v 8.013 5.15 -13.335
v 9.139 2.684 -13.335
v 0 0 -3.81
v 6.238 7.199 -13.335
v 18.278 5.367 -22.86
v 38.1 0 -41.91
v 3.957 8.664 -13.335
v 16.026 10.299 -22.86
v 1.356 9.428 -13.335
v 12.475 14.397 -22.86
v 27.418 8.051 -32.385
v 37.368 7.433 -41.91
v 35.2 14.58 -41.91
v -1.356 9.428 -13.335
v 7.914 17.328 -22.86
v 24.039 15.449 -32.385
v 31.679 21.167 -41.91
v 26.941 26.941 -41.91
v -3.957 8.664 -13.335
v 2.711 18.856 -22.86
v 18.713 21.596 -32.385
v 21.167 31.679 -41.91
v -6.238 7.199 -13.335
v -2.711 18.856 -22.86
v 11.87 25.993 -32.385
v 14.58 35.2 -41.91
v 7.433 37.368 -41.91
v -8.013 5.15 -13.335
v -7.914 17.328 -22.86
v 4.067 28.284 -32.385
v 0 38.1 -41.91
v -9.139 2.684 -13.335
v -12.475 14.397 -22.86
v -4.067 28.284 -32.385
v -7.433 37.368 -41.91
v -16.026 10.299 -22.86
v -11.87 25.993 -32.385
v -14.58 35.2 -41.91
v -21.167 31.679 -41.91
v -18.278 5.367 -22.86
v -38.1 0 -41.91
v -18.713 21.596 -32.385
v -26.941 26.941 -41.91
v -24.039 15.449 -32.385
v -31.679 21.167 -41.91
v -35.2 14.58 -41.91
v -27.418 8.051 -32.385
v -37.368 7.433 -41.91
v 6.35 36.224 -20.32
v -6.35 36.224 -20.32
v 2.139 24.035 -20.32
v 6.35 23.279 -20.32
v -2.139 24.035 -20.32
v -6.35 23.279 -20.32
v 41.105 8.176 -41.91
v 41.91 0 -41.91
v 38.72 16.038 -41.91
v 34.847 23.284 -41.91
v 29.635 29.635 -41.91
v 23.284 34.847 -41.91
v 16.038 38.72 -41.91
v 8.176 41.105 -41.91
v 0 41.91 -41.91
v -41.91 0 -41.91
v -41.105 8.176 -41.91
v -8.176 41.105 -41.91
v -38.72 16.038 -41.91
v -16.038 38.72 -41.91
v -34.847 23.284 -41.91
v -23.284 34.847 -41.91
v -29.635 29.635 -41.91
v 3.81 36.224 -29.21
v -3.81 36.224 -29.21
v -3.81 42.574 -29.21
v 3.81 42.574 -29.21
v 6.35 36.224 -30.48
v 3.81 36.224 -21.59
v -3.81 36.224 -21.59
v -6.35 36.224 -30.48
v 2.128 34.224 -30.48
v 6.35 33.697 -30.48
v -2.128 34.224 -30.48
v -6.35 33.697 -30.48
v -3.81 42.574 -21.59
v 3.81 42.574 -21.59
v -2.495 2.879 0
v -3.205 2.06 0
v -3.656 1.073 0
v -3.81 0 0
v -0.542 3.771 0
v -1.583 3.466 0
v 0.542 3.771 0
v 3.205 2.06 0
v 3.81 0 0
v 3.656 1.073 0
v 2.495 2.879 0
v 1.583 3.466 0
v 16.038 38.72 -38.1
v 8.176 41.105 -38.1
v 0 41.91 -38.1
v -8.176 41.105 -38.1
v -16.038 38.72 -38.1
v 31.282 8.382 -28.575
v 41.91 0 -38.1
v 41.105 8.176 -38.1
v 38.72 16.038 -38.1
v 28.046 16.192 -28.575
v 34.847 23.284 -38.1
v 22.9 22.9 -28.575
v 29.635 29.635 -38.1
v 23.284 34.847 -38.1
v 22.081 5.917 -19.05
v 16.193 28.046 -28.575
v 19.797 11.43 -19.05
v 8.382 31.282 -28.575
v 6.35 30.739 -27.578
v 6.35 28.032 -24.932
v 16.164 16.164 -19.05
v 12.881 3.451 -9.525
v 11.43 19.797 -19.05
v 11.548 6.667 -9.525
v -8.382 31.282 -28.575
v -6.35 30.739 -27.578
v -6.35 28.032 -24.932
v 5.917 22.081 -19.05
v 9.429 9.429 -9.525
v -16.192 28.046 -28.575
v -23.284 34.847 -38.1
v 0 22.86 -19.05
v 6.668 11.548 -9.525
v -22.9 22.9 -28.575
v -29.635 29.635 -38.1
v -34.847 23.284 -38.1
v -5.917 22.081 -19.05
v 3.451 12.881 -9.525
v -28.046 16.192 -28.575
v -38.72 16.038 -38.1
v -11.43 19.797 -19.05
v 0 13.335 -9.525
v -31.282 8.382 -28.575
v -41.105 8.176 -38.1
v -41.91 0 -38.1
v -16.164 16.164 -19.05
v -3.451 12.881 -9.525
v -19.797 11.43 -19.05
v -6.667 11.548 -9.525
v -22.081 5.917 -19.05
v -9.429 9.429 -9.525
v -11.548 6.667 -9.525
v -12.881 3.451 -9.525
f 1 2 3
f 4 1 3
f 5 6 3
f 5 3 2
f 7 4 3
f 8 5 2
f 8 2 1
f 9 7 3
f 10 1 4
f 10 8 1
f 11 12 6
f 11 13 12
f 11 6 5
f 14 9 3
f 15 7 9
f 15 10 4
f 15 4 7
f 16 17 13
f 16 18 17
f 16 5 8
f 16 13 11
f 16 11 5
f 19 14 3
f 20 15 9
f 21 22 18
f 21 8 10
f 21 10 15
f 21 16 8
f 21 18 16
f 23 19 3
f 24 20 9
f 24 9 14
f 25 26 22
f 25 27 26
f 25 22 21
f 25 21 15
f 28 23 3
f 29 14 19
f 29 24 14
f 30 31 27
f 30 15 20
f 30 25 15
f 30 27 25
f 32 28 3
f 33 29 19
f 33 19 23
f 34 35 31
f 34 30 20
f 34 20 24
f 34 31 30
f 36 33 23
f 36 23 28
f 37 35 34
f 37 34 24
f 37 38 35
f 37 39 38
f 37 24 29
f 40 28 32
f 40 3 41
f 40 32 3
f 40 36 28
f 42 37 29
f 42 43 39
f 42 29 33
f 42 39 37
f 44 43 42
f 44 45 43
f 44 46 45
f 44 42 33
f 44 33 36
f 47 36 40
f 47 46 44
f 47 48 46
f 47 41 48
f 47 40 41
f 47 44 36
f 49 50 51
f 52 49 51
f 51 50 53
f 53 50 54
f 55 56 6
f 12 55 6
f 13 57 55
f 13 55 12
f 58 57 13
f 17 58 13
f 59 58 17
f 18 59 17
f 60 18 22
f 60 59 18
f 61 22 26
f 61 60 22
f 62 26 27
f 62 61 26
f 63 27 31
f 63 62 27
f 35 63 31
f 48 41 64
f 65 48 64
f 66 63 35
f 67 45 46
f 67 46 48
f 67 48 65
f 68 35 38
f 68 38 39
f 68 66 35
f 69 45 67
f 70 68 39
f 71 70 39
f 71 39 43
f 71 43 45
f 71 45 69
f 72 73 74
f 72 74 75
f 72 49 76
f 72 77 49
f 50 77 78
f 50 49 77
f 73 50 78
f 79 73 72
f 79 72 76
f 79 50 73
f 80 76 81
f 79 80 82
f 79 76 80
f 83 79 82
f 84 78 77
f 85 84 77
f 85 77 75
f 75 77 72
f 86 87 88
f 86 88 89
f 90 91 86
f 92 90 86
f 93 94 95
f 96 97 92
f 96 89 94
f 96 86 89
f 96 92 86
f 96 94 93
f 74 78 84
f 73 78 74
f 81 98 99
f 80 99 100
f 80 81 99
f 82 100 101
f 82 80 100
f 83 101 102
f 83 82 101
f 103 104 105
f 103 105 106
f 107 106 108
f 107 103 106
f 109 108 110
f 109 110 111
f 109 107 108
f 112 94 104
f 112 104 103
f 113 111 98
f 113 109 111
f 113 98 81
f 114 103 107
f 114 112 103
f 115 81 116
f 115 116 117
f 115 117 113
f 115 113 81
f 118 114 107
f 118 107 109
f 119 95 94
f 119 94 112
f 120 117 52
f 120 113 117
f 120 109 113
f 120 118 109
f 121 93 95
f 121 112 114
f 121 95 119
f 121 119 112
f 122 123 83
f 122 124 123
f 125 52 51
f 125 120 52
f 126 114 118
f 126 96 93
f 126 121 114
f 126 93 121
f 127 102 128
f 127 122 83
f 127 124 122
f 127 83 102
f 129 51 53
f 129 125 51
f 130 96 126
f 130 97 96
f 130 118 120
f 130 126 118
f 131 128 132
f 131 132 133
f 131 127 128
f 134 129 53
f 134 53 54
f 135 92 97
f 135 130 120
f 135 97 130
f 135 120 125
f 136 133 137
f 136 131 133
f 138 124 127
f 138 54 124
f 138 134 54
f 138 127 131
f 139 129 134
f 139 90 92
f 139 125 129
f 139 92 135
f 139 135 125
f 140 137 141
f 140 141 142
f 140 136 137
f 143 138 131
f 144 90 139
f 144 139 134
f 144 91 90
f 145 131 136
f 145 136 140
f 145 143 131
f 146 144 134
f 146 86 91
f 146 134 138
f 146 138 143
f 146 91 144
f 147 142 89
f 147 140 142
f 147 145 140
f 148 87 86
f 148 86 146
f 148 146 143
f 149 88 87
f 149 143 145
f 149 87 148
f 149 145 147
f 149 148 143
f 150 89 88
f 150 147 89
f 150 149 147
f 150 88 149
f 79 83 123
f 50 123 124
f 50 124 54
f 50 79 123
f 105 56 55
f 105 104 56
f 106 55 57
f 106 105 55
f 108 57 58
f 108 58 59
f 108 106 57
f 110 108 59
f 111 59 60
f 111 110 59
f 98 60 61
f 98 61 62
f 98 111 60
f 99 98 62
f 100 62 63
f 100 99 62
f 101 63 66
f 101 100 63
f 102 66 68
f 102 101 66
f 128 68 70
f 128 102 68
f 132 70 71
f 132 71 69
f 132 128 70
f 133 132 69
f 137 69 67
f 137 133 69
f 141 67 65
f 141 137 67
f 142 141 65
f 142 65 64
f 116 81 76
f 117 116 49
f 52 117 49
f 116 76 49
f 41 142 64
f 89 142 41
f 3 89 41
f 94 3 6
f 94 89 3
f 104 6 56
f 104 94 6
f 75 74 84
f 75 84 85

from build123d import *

# Parameters (mm, degrees)
REVOLVE2_ANGLE           = 180
BOSS_EXTRUDE1_DEPTH      = 6.35
BOSS_EXTRUDE1_DEPTH_BACK = 6.35
SKETCH10_W               = 7.62
SKETCH10_H               = 7.62
BOSS_EXTRUDE2_DEPTH      = 6.35


# Read off the part's stored shape, not the designer's step: Revolve2
with BuildPart() as part:
    # Revolve2 outline → Revolve2 (revolve)
    with BuildSketch(Plane.XZ):
        Polygon((3.81, 0), (0, 0), (0, -3.81), (38.1, -41.91), (41.91, -41.91), (41.91, -38.1), align=None)
    revolve(axis=Axis((0, 0, 0), (0, 0, 1)), revolution_arc=REVOLVE2_ANGLE)

    # Sketch6 → Boss-Extrude1 (add, two sides: drawn at the far end of the back side and taken through both)
    with BuildSketch(Plane(origin=(0, 0, 0), x_dir=(0, 0, -1), z_dir=(1, 0, 0)).offset(-BOSS_EXTRUDE1_DEPTH_BACK)):
        Polygon((20.32, 20.32), (20.32, 29.318948776), (20.32, 36.223650293), (30.48, 36.223650293), (30.48, 30.48), align=None)
    extrude(amount=BOSS_EXTRUDE1_DEPTH + BOSS_EXTRUDE1_DEPTH_BACK)

    # Sketch10 → Boss-Extrude2 (add)
    with BuildSketch(Plane(origin=(0, 36.223650293, 0), x_dir=(1, 0, 0), z_dir=(0, 1, 0))):
        with Locations((0, 25.4)):
            Rectangle(SKETCH10_W, SKETCH10_H)
    extrude(amount=BOSS_EXTRUDE2_DEPTH)


solid = part.part
